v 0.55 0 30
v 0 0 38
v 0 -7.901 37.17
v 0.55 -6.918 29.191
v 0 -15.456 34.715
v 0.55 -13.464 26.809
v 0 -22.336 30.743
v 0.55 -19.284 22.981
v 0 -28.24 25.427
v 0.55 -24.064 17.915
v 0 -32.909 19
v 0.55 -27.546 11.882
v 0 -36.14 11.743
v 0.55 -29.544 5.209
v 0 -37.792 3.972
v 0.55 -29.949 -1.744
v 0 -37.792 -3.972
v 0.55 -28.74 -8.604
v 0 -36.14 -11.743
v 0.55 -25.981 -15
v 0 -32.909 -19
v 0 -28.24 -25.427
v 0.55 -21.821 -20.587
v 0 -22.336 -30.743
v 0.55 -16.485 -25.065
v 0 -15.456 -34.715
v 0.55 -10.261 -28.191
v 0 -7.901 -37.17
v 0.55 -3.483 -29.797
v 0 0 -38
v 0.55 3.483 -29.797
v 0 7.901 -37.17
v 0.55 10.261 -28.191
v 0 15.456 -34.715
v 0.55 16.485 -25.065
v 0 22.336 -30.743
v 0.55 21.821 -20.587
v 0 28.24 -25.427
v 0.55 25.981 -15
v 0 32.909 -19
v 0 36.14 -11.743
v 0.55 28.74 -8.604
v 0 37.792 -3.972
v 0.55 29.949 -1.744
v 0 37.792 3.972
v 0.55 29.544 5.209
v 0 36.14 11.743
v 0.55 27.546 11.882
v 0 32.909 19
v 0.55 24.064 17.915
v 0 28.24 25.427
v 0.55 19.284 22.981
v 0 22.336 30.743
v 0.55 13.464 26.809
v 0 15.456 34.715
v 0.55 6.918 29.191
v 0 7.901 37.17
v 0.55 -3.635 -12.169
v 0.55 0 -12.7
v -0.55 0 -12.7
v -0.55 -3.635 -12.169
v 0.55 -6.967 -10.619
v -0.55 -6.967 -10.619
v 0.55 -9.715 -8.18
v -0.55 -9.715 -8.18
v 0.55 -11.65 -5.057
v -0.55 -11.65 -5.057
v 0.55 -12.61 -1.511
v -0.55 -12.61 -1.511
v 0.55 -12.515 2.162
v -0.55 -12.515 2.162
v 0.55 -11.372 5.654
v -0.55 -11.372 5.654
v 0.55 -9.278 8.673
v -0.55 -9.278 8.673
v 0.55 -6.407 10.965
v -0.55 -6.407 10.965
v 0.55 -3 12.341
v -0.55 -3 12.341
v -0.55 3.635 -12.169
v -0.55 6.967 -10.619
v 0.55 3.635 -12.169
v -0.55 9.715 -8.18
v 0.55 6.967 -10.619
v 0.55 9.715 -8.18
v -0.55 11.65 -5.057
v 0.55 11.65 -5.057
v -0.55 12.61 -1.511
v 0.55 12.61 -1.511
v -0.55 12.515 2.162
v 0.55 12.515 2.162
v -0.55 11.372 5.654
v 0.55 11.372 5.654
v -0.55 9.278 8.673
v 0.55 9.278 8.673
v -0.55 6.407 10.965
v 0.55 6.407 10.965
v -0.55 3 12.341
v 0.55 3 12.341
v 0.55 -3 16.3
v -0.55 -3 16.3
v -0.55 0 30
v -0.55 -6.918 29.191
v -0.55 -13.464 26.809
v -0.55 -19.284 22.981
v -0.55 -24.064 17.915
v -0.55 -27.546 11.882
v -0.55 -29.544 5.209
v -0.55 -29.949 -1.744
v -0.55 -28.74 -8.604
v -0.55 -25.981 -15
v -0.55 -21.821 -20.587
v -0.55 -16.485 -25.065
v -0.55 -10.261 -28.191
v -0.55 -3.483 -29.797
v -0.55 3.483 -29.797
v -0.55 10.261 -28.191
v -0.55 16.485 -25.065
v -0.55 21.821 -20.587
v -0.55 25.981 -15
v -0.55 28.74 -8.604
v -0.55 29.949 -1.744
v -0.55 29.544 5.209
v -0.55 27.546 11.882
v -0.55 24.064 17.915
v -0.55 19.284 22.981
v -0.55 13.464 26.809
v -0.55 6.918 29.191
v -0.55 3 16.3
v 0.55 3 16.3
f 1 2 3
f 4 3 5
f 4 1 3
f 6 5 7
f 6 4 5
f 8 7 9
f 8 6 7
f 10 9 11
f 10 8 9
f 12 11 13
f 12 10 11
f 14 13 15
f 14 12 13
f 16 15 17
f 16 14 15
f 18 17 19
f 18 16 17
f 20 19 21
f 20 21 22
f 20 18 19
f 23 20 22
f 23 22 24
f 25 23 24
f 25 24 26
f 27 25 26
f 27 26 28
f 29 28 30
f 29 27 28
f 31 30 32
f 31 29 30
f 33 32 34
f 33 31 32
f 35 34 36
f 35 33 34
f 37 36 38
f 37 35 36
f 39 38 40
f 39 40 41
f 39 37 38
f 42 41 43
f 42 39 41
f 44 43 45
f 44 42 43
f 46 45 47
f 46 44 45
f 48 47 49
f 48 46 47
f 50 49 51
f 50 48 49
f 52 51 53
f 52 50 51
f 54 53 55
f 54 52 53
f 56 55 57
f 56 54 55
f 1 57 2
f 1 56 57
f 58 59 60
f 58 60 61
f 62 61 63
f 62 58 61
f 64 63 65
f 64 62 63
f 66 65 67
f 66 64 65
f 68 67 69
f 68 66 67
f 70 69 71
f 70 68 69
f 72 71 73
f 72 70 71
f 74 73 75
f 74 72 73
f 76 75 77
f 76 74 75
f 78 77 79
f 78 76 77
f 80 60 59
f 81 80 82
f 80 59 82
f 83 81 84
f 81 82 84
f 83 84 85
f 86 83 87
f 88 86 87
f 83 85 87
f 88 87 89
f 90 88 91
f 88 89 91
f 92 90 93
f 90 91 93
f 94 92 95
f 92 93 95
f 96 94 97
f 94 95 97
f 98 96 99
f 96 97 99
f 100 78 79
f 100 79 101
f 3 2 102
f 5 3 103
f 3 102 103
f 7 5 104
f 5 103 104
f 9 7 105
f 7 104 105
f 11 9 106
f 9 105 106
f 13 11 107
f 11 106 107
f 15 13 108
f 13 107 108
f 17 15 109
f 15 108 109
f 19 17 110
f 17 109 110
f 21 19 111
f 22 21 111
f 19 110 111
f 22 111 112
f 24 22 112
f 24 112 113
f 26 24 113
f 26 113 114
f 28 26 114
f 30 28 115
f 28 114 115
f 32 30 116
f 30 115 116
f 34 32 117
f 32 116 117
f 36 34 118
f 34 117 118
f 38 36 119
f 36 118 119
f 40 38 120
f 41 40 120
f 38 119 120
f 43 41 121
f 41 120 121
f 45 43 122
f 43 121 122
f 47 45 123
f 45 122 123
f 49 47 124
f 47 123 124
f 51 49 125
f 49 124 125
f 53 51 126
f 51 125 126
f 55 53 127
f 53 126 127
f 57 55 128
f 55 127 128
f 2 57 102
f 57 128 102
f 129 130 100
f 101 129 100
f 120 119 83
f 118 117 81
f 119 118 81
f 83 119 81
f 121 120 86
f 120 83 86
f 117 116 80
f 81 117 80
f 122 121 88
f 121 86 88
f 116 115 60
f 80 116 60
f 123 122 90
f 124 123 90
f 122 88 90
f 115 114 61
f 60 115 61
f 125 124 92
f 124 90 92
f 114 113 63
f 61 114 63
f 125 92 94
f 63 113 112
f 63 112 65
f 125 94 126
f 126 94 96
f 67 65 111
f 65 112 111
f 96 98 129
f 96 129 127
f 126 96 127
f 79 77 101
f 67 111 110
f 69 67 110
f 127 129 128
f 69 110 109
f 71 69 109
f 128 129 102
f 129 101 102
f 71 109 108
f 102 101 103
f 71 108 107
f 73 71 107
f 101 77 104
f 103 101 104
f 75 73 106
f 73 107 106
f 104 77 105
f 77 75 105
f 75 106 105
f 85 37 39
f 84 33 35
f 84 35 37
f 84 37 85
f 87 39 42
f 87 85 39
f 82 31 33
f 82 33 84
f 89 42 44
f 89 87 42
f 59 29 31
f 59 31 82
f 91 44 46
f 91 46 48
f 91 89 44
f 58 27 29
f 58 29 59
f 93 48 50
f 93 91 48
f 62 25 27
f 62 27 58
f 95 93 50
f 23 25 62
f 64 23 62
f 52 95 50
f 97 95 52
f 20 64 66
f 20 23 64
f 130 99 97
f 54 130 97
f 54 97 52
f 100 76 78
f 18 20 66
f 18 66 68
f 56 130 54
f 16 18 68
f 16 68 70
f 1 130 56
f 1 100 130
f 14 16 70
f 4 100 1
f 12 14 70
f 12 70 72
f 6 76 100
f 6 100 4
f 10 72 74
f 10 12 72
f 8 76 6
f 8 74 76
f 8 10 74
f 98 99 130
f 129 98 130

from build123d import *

# Parameters (mm, degrees)
POCKET_DEPTH      = 215.522719
POCKET_DEPTH_BACK = 215.522719


with BuildPart() as part:
    # Sketch001 → Revolution (revolve)
    with BuildSketch(Plane.XZ):
        Polygon((0, 38), (0.55, 30), (0.55, 0), (0, 0), align=None)
    revolution = revolve(axis=Axis((0, 0, 0), (1, 0, 0)))

    # Mirrored: Revolution across Sketch001 V_Axis
    add(revolution.mirror(Plane(origin=(0, 0, 0), x_dir=(0, -1, 0), z_dir=(1, 0, 0))))

    # Sketch002 → Pocket (cut, two sides)
    with BuildSketch(Plane.YZ) as pocket_sk:
        with BuildLine():
            Line((3, 12.340583), (3, 16.3))
            Line((3, 16.3), (0, 16.3))
            Line((0, 16.3), (0, -12.7))
            ThreePointArc((0, -12.7), (12.609826, -1.510727), (3, 12.340583))
        make_face()
    pocket = extrude(amount=-POCKET_DEPTH, mode=Mode.SUBTRACT) + extrude(pocket_sk.sketch, amount=POCKET_DEPTH_BACK, mode=Mode.SUBTRACT)

    # Mirrored001: Pocket across Sketch002 V_Axis
    add(pocket.mirror(Plane(origin=(0, 0, 0), x_dir=(1, 0, 0), z_dir=(0, 1, 0))), mode=Mode.SUBTRACT)


solid = part.part
